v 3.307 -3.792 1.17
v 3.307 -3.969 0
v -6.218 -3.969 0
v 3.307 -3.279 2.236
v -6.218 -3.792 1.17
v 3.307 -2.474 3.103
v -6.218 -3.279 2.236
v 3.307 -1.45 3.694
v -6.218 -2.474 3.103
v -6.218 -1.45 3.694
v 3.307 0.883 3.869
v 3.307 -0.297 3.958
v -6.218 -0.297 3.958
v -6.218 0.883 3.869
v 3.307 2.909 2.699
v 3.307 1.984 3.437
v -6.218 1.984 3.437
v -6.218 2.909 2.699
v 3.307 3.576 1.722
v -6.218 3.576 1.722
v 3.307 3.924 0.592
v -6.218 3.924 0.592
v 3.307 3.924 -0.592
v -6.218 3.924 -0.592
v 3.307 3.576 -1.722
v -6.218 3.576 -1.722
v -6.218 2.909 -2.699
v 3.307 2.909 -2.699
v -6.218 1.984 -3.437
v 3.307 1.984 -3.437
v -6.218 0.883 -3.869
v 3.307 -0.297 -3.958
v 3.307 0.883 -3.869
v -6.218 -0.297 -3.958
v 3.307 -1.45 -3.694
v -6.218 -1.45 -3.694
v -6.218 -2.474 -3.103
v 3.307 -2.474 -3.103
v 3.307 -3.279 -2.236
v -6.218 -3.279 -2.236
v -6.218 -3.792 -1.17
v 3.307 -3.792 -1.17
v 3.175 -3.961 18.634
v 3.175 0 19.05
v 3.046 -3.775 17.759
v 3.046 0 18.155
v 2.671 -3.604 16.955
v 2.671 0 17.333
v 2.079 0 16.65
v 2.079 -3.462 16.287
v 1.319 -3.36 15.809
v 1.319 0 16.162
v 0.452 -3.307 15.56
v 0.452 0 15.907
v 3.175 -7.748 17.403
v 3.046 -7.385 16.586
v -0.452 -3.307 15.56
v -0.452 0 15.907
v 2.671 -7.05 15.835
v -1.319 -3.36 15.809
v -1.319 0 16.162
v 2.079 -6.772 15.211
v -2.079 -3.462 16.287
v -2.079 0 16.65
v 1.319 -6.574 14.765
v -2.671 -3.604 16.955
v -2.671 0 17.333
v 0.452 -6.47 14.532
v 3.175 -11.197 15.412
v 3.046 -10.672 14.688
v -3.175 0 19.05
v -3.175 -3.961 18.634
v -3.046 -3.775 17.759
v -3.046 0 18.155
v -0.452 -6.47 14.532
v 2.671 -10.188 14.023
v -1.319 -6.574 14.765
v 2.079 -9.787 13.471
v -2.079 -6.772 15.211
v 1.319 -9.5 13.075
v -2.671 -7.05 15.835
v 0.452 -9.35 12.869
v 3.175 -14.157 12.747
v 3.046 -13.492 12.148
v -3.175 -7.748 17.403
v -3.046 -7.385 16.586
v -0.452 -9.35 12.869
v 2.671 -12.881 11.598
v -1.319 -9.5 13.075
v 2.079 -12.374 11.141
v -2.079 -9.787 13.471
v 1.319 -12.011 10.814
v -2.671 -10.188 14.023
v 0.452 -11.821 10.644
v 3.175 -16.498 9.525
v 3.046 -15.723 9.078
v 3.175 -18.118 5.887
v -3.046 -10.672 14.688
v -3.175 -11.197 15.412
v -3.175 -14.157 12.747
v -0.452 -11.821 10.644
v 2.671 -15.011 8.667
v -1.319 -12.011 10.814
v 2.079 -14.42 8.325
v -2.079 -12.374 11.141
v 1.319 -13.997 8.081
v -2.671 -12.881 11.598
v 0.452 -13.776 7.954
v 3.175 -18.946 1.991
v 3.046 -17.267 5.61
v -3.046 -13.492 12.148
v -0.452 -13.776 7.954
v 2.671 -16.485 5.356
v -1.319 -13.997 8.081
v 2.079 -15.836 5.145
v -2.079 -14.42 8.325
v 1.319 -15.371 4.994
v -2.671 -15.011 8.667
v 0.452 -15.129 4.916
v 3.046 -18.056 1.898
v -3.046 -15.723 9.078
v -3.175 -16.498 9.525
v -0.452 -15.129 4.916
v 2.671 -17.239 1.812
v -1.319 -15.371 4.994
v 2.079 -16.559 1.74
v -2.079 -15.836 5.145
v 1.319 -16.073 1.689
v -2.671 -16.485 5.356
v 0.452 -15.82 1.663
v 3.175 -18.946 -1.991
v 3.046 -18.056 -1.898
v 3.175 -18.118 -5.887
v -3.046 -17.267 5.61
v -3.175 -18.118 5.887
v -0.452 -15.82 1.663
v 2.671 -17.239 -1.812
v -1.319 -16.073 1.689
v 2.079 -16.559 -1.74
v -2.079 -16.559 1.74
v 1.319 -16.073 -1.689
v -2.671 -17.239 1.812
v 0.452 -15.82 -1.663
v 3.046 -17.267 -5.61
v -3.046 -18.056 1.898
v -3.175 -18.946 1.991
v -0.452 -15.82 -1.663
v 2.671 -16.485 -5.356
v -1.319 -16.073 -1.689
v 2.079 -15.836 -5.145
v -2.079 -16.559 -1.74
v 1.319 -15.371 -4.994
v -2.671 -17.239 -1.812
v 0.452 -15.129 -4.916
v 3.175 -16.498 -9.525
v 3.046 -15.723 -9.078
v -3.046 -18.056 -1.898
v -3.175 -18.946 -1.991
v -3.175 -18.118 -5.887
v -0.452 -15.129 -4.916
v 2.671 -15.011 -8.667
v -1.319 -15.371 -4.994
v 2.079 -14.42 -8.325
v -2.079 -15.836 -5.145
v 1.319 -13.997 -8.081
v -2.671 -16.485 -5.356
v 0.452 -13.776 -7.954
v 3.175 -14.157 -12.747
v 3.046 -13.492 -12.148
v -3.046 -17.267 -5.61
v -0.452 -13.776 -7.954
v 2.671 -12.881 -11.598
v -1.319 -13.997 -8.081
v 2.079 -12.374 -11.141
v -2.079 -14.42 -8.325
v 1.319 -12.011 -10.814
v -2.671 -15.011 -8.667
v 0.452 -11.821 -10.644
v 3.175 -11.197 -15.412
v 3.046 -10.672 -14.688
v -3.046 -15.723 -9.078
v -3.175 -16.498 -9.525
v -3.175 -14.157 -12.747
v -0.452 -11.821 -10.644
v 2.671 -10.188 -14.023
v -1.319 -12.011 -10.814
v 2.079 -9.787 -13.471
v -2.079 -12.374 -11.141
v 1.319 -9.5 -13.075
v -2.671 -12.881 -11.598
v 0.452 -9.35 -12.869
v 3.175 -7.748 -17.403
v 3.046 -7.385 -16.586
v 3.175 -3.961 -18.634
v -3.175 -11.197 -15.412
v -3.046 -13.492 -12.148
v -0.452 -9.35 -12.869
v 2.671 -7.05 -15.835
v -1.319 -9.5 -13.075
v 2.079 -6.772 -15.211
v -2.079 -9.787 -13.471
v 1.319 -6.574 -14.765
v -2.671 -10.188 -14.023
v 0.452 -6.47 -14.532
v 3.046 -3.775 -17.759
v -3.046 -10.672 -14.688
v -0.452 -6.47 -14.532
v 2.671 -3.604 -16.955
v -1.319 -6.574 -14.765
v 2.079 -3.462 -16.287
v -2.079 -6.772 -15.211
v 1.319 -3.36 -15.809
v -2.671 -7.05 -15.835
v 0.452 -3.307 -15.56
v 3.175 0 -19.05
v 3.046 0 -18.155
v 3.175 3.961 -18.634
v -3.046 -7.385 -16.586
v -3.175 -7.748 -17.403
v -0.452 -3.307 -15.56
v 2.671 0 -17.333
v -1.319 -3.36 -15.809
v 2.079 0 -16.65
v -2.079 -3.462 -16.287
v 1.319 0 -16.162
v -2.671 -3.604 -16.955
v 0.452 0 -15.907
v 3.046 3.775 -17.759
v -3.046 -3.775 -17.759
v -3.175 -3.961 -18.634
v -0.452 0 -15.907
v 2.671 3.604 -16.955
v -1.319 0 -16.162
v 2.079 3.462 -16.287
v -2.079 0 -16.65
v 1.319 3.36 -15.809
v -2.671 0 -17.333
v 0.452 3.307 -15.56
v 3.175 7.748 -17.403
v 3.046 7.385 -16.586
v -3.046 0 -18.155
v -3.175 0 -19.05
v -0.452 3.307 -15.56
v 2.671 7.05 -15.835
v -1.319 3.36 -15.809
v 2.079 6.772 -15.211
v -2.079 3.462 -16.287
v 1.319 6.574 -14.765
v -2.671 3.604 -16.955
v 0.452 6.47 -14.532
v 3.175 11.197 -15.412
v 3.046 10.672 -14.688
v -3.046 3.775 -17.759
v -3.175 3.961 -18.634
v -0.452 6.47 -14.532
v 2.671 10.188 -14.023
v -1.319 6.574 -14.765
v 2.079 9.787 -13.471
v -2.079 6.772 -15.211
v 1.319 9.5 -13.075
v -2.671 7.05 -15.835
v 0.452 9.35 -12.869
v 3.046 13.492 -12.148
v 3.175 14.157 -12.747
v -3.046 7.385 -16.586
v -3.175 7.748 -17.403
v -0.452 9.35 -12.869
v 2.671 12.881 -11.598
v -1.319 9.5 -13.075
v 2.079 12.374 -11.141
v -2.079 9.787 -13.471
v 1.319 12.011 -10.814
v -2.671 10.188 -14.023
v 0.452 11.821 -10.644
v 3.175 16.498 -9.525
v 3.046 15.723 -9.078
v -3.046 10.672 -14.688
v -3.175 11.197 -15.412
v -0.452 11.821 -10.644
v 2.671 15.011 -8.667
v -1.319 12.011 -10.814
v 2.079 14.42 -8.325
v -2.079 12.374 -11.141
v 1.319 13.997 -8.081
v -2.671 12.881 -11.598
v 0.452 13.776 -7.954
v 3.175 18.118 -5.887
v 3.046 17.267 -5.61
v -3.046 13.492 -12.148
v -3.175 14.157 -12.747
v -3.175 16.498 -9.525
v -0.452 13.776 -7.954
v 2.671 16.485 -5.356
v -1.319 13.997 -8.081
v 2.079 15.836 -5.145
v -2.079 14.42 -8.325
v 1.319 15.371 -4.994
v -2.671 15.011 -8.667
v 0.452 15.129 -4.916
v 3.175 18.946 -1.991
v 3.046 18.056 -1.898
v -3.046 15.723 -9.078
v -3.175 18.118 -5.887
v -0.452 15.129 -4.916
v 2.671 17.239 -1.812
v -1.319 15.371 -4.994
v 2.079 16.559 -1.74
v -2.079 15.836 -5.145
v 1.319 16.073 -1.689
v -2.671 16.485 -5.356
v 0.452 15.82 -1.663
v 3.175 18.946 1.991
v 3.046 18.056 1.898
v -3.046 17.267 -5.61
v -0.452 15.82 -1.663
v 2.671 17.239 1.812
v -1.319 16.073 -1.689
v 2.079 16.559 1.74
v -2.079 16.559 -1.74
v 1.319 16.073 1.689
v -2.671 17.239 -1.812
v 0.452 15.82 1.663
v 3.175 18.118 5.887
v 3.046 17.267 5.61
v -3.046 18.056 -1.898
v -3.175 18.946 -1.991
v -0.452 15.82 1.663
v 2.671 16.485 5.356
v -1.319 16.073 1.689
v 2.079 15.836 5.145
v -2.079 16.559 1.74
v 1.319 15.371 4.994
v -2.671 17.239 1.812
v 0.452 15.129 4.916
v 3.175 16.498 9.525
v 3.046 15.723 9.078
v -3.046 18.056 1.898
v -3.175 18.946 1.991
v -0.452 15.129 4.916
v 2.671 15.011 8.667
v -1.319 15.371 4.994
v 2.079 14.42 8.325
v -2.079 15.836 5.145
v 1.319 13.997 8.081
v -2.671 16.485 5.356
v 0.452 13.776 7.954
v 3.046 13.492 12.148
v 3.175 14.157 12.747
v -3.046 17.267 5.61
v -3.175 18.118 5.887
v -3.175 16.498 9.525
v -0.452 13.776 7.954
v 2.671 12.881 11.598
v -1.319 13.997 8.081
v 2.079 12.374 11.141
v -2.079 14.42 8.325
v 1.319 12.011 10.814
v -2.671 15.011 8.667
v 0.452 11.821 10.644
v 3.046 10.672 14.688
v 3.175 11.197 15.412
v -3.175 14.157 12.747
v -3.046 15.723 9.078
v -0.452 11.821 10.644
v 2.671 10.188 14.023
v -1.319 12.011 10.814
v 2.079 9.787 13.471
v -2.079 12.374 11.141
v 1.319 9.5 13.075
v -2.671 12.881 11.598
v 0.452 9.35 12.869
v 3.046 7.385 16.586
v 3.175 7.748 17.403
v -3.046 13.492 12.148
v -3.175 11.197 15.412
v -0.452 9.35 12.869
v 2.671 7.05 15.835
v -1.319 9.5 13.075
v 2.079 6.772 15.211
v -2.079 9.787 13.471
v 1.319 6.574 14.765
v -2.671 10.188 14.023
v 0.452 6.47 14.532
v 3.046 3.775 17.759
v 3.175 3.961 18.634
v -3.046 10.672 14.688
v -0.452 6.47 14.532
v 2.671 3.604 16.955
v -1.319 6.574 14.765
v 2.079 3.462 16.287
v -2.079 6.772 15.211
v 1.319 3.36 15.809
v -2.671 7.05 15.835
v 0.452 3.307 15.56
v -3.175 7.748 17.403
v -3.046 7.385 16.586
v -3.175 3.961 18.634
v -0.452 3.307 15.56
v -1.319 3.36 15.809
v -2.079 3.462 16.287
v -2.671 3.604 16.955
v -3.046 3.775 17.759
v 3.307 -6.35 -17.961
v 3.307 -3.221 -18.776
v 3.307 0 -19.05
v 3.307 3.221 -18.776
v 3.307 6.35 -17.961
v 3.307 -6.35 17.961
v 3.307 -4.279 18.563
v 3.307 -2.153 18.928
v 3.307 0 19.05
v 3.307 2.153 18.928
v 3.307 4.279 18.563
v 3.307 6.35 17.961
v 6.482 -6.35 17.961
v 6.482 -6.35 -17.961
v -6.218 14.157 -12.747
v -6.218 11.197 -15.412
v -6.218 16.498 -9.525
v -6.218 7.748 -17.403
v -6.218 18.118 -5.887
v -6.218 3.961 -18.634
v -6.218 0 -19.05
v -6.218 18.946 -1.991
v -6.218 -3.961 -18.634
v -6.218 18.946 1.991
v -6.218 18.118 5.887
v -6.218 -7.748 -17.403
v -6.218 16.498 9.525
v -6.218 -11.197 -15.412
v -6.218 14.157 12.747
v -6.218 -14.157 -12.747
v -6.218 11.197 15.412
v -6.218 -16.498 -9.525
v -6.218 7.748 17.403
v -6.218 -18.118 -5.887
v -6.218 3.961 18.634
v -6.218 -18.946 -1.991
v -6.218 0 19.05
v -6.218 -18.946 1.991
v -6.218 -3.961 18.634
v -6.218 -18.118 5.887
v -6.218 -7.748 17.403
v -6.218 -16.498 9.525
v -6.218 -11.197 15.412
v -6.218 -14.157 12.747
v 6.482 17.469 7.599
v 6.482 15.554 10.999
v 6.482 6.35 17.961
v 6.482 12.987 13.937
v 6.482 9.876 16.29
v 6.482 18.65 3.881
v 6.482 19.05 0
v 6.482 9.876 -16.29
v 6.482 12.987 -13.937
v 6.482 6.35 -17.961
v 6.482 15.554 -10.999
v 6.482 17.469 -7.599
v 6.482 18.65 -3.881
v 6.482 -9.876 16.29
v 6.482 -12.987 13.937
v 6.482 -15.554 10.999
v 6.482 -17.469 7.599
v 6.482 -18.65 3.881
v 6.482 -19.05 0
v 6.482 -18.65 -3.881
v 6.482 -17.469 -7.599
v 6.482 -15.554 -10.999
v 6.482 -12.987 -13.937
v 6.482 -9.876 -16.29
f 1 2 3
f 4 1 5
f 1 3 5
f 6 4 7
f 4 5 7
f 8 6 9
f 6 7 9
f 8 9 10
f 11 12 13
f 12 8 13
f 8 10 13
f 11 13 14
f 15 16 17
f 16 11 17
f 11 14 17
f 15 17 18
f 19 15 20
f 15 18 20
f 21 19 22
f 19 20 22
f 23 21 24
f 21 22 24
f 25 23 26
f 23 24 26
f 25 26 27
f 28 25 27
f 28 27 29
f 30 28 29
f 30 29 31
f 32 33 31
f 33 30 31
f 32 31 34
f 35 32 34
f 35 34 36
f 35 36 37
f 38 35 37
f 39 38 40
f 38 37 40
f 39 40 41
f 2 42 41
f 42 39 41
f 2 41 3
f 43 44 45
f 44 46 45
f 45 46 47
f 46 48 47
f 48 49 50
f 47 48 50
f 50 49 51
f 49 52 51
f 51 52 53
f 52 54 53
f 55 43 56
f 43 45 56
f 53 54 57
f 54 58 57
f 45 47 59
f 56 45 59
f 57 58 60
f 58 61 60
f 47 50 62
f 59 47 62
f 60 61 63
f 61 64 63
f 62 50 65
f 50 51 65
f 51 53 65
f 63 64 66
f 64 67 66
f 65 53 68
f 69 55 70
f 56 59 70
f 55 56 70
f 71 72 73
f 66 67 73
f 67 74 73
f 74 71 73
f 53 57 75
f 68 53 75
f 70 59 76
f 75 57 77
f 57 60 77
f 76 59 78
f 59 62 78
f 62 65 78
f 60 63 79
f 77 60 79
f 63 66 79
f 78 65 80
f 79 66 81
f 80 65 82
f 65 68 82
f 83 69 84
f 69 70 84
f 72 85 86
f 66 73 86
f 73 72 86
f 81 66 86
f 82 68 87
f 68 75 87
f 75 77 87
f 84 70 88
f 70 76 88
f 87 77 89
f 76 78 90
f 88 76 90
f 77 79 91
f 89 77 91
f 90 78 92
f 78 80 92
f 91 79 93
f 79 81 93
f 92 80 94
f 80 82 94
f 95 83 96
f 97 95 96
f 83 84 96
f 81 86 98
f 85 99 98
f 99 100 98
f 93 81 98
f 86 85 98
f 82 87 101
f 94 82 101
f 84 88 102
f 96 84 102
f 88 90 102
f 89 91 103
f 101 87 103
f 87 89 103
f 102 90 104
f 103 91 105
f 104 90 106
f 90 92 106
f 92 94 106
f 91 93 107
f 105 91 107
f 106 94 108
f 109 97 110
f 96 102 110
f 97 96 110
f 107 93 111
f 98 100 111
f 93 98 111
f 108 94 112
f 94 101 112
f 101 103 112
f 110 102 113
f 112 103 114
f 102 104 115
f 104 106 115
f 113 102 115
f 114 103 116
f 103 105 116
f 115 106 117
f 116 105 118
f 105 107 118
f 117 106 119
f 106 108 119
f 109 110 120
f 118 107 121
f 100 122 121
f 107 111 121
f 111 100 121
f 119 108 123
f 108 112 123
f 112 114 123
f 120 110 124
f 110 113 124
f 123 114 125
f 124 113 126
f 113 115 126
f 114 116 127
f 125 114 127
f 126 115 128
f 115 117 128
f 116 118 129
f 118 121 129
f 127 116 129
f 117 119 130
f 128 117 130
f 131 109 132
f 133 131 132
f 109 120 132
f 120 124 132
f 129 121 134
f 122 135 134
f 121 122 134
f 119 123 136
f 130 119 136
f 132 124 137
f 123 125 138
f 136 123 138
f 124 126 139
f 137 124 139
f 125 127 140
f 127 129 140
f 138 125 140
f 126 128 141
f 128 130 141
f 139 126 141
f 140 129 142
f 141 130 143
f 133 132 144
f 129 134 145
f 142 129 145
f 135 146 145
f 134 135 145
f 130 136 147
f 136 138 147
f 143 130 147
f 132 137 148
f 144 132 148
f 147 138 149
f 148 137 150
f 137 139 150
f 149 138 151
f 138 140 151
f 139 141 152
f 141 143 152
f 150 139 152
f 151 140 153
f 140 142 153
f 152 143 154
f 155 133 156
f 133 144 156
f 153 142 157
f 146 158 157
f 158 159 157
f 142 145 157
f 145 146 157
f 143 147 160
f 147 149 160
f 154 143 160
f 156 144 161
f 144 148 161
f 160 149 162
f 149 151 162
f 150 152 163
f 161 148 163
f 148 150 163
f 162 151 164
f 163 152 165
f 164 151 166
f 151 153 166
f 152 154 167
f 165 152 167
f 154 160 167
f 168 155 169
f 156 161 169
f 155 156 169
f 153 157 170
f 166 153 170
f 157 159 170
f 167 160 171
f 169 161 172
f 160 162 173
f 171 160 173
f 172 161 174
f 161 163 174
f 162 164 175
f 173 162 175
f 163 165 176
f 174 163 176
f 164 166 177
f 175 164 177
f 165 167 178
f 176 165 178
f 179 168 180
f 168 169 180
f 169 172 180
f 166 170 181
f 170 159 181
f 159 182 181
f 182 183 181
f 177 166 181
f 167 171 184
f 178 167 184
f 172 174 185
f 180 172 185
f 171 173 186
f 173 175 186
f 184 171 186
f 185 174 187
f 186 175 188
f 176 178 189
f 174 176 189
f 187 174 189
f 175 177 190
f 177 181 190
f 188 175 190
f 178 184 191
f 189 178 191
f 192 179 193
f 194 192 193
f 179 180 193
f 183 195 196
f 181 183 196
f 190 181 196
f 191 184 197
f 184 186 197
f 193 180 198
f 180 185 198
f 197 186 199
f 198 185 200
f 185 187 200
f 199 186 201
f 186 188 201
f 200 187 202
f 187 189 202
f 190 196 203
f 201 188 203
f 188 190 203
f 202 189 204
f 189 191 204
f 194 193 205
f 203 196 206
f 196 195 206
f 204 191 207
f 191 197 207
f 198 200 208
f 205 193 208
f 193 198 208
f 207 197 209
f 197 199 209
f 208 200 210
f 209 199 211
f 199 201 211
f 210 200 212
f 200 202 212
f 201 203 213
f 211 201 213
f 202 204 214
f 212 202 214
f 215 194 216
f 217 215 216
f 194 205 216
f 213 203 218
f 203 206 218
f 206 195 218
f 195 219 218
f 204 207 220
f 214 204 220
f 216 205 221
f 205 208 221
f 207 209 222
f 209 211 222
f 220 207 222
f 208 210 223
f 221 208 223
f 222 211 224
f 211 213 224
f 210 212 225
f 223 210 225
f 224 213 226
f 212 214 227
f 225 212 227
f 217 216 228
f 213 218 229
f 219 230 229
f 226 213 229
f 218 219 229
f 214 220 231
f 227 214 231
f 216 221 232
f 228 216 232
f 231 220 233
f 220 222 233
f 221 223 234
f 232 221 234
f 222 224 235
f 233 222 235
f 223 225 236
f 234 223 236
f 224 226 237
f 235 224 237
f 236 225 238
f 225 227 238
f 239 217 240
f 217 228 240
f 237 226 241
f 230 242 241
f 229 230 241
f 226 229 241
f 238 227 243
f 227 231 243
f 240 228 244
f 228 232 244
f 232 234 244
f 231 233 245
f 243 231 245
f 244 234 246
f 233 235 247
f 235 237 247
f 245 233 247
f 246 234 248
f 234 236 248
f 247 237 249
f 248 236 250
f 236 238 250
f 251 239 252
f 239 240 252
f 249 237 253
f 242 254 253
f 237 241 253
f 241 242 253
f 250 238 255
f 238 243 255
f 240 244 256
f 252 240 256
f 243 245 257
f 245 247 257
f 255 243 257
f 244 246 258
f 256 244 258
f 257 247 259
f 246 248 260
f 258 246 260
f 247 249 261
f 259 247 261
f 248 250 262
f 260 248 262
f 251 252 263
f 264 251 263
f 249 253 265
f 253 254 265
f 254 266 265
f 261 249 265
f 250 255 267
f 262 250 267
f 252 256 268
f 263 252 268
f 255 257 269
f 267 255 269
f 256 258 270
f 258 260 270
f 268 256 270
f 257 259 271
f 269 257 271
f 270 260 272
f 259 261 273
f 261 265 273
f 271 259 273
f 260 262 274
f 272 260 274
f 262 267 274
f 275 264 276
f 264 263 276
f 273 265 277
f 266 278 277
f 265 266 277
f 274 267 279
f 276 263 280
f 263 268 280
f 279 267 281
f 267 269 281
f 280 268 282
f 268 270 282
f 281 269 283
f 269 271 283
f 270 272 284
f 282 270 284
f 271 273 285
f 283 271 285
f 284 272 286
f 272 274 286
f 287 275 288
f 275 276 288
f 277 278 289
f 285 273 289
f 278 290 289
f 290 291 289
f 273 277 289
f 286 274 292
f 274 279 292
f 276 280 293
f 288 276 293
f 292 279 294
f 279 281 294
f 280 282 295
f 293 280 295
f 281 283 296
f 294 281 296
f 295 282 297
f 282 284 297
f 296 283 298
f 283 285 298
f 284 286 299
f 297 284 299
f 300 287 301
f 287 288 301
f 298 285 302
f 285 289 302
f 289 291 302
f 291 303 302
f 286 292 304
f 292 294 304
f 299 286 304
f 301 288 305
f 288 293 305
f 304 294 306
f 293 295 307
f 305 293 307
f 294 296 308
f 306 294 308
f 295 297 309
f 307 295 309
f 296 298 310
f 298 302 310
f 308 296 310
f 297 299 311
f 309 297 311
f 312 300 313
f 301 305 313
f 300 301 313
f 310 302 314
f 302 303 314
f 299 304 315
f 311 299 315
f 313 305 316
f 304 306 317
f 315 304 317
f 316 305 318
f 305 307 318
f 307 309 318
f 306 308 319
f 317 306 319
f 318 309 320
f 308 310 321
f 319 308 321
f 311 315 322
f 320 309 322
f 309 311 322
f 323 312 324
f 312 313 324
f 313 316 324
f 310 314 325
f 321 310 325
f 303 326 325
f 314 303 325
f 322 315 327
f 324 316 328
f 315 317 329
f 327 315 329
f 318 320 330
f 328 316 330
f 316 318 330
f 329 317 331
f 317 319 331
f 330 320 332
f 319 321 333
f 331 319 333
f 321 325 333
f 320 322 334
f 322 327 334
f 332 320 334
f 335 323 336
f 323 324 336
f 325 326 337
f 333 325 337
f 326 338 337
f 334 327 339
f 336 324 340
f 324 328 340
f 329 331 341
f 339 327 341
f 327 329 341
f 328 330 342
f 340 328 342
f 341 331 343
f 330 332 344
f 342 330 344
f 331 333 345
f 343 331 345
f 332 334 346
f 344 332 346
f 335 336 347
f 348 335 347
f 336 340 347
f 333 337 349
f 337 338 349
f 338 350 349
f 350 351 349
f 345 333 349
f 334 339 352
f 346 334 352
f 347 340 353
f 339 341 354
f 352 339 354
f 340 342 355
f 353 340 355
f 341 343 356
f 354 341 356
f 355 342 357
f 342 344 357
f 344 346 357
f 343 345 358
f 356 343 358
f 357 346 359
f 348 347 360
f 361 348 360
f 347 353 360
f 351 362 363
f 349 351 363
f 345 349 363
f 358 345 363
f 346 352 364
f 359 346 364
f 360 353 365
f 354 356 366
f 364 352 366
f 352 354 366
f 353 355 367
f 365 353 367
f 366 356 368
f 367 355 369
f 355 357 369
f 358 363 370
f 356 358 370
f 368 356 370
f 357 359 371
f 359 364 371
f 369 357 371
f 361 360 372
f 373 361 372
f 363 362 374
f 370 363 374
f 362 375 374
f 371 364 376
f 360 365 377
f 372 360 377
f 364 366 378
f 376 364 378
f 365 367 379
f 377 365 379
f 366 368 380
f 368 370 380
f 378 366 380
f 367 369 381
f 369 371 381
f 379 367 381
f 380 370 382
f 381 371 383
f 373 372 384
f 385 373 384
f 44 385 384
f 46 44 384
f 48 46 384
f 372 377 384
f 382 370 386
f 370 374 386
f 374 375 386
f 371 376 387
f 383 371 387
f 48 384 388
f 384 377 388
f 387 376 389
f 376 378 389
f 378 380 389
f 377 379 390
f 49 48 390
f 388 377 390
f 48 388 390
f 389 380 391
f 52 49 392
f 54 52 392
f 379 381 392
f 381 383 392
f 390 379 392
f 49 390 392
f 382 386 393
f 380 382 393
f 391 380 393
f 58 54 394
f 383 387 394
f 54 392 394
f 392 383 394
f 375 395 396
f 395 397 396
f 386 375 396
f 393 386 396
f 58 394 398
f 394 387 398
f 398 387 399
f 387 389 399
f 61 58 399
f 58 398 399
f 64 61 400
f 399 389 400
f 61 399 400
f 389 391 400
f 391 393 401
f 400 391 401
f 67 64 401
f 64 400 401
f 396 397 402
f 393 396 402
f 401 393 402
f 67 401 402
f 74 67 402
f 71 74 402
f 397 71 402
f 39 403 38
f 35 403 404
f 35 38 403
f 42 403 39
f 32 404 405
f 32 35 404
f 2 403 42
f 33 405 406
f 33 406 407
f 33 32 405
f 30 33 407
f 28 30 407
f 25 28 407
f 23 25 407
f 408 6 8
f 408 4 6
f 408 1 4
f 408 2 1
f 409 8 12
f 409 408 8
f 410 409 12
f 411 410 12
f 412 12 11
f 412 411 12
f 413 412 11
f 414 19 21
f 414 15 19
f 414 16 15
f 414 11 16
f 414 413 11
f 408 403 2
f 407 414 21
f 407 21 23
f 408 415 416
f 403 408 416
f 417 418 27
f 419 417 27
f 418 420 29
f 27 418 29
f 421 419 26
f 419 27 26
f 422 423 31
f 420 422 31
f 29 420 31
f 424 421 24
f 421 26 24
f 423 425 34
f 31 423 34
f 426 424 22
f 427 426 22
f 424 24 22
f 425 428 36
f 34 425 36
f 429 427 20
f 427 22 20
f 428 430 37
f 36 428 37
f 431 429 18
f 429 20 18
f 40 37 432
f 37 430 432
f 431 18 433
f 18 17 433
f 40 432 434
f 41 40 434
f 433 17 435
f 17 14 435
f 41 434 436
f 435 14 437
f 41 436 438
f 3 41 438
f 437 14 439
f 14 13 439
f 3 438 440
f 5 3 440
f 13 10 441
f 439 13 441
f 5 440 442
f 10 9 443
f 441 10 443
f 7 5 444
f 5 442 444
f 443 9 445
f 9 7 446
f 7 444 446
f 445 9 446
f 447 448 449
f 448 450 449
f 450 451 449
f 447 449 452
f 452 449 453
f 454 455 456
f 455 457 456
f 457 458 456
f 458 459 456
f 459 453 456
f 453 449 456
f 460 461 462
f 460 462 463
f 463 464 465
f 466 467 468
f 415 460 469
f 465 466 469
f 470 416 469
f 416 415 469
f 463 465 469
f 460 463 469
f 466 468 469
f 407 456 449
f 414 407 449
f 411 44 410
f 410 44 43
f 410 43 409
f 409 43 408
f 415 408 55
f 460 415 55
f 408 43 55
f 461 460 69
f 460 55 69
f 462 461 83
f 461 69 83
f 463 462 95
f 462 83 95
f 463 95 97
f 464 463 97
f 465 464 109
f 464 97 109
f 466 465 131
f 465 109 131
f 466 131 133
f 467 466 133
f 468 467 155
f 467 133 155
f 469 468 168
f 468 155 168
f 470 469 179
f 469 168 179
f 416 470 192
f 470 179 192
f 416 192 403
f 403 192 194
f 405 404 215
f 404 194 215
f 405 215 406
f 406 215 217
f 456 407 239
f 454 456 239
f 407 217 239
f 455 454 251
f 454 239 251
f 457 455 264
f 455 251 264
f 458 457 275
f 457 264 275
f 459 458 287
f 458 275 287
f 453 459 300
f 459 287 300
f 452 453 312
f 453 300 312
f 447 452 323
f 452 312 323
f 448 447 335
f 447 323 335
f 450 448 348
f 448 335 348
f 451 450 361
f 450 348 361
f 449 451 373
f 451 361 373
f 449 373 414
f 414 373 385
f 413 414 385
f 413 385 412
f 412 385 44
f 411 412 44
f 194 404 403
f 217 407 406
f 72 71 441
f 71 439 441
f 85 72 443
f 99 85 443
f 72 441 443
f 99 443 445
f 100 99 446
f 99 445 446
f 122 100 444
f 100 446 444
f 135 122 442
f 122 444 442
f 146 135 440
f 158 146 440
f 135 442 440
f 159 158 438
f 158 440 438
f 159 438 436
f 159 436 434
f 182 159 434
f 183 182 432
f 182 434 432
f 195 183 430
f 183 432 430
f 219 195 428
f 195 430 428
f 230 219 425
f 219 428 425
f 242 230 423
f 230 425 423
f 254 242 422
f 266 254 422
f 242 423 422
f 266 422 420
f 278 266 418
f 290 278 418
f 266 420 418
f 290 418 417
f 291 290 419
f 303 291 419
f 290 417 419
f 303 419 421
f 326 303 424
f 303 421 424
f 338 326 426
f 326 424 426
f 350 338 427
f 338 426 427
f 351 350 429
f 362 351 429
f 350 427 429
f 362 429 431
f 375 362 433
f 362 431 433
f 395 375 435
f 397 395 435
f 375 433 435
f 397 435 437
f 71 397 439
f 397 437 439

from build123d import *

# Parameters (mm, degrees)
F2_R     = 3.96875
F3_DEPTH = 3.175
F4_R     = 3.96875
F5_DEPTH = 12.701


with BuildPart() as f1:
    # F0 (on Front) → F1 (revolve)
    with BuildSketch(Plane.XZ):
        with BuildLine():
            Line((-6.218406, 19.05), (-6.218406, 0))
            Line((-6.218406, 0), (6.481594, 0))
            Line((6.481594, 0), (6.481594, 19.05))
            Line((6.481594, 19.05), (3.175, 19.05))
            ThreePointArc((3.175, 19.05), (0, 15.875), (-3.175, 19.05))
            Line((-3.175, 19.05), (-6.218406, 19.05))
        make_face()
    revolve(axis=Axis((0.131594, 0, 0), (1, 0, 0)))

    # F2 (on face) → F3 (cut)
    with BuildSketch(Plane.YZ.offset(6.481594)):
        with BuildLine():
            ThreePointArc((6.35, 17.960512), (0, 19.05), (-6.35, 17.960512))
            Line((-6.35, 17.960512), (-6.35, -17.960512))
            ThreePointArc((-6.35, -17.960512), (0, -19.05), (6.35, -17.960512))
            Line((6.35, -17.960512), (6.35, 17.960512))
        make_face()
        Circle(F2_R, mode=Mode.SUBTRACT)
    extrude(amount=-F3_DEPTH, mode=Mode.SUBTRACT)

    # F4 (on face) → F5 (cut, through all)
    with BuildSketch(Plane(origin=(-6.218406, 0, 0), x_dir=(0, -1, 0), z_dir=(-1, 0, 0))):
        Circle(F4_R)
    extrude(amount=-F5_DEPTH, mode=Mode.SUBTRACT)


solid = f1.part
